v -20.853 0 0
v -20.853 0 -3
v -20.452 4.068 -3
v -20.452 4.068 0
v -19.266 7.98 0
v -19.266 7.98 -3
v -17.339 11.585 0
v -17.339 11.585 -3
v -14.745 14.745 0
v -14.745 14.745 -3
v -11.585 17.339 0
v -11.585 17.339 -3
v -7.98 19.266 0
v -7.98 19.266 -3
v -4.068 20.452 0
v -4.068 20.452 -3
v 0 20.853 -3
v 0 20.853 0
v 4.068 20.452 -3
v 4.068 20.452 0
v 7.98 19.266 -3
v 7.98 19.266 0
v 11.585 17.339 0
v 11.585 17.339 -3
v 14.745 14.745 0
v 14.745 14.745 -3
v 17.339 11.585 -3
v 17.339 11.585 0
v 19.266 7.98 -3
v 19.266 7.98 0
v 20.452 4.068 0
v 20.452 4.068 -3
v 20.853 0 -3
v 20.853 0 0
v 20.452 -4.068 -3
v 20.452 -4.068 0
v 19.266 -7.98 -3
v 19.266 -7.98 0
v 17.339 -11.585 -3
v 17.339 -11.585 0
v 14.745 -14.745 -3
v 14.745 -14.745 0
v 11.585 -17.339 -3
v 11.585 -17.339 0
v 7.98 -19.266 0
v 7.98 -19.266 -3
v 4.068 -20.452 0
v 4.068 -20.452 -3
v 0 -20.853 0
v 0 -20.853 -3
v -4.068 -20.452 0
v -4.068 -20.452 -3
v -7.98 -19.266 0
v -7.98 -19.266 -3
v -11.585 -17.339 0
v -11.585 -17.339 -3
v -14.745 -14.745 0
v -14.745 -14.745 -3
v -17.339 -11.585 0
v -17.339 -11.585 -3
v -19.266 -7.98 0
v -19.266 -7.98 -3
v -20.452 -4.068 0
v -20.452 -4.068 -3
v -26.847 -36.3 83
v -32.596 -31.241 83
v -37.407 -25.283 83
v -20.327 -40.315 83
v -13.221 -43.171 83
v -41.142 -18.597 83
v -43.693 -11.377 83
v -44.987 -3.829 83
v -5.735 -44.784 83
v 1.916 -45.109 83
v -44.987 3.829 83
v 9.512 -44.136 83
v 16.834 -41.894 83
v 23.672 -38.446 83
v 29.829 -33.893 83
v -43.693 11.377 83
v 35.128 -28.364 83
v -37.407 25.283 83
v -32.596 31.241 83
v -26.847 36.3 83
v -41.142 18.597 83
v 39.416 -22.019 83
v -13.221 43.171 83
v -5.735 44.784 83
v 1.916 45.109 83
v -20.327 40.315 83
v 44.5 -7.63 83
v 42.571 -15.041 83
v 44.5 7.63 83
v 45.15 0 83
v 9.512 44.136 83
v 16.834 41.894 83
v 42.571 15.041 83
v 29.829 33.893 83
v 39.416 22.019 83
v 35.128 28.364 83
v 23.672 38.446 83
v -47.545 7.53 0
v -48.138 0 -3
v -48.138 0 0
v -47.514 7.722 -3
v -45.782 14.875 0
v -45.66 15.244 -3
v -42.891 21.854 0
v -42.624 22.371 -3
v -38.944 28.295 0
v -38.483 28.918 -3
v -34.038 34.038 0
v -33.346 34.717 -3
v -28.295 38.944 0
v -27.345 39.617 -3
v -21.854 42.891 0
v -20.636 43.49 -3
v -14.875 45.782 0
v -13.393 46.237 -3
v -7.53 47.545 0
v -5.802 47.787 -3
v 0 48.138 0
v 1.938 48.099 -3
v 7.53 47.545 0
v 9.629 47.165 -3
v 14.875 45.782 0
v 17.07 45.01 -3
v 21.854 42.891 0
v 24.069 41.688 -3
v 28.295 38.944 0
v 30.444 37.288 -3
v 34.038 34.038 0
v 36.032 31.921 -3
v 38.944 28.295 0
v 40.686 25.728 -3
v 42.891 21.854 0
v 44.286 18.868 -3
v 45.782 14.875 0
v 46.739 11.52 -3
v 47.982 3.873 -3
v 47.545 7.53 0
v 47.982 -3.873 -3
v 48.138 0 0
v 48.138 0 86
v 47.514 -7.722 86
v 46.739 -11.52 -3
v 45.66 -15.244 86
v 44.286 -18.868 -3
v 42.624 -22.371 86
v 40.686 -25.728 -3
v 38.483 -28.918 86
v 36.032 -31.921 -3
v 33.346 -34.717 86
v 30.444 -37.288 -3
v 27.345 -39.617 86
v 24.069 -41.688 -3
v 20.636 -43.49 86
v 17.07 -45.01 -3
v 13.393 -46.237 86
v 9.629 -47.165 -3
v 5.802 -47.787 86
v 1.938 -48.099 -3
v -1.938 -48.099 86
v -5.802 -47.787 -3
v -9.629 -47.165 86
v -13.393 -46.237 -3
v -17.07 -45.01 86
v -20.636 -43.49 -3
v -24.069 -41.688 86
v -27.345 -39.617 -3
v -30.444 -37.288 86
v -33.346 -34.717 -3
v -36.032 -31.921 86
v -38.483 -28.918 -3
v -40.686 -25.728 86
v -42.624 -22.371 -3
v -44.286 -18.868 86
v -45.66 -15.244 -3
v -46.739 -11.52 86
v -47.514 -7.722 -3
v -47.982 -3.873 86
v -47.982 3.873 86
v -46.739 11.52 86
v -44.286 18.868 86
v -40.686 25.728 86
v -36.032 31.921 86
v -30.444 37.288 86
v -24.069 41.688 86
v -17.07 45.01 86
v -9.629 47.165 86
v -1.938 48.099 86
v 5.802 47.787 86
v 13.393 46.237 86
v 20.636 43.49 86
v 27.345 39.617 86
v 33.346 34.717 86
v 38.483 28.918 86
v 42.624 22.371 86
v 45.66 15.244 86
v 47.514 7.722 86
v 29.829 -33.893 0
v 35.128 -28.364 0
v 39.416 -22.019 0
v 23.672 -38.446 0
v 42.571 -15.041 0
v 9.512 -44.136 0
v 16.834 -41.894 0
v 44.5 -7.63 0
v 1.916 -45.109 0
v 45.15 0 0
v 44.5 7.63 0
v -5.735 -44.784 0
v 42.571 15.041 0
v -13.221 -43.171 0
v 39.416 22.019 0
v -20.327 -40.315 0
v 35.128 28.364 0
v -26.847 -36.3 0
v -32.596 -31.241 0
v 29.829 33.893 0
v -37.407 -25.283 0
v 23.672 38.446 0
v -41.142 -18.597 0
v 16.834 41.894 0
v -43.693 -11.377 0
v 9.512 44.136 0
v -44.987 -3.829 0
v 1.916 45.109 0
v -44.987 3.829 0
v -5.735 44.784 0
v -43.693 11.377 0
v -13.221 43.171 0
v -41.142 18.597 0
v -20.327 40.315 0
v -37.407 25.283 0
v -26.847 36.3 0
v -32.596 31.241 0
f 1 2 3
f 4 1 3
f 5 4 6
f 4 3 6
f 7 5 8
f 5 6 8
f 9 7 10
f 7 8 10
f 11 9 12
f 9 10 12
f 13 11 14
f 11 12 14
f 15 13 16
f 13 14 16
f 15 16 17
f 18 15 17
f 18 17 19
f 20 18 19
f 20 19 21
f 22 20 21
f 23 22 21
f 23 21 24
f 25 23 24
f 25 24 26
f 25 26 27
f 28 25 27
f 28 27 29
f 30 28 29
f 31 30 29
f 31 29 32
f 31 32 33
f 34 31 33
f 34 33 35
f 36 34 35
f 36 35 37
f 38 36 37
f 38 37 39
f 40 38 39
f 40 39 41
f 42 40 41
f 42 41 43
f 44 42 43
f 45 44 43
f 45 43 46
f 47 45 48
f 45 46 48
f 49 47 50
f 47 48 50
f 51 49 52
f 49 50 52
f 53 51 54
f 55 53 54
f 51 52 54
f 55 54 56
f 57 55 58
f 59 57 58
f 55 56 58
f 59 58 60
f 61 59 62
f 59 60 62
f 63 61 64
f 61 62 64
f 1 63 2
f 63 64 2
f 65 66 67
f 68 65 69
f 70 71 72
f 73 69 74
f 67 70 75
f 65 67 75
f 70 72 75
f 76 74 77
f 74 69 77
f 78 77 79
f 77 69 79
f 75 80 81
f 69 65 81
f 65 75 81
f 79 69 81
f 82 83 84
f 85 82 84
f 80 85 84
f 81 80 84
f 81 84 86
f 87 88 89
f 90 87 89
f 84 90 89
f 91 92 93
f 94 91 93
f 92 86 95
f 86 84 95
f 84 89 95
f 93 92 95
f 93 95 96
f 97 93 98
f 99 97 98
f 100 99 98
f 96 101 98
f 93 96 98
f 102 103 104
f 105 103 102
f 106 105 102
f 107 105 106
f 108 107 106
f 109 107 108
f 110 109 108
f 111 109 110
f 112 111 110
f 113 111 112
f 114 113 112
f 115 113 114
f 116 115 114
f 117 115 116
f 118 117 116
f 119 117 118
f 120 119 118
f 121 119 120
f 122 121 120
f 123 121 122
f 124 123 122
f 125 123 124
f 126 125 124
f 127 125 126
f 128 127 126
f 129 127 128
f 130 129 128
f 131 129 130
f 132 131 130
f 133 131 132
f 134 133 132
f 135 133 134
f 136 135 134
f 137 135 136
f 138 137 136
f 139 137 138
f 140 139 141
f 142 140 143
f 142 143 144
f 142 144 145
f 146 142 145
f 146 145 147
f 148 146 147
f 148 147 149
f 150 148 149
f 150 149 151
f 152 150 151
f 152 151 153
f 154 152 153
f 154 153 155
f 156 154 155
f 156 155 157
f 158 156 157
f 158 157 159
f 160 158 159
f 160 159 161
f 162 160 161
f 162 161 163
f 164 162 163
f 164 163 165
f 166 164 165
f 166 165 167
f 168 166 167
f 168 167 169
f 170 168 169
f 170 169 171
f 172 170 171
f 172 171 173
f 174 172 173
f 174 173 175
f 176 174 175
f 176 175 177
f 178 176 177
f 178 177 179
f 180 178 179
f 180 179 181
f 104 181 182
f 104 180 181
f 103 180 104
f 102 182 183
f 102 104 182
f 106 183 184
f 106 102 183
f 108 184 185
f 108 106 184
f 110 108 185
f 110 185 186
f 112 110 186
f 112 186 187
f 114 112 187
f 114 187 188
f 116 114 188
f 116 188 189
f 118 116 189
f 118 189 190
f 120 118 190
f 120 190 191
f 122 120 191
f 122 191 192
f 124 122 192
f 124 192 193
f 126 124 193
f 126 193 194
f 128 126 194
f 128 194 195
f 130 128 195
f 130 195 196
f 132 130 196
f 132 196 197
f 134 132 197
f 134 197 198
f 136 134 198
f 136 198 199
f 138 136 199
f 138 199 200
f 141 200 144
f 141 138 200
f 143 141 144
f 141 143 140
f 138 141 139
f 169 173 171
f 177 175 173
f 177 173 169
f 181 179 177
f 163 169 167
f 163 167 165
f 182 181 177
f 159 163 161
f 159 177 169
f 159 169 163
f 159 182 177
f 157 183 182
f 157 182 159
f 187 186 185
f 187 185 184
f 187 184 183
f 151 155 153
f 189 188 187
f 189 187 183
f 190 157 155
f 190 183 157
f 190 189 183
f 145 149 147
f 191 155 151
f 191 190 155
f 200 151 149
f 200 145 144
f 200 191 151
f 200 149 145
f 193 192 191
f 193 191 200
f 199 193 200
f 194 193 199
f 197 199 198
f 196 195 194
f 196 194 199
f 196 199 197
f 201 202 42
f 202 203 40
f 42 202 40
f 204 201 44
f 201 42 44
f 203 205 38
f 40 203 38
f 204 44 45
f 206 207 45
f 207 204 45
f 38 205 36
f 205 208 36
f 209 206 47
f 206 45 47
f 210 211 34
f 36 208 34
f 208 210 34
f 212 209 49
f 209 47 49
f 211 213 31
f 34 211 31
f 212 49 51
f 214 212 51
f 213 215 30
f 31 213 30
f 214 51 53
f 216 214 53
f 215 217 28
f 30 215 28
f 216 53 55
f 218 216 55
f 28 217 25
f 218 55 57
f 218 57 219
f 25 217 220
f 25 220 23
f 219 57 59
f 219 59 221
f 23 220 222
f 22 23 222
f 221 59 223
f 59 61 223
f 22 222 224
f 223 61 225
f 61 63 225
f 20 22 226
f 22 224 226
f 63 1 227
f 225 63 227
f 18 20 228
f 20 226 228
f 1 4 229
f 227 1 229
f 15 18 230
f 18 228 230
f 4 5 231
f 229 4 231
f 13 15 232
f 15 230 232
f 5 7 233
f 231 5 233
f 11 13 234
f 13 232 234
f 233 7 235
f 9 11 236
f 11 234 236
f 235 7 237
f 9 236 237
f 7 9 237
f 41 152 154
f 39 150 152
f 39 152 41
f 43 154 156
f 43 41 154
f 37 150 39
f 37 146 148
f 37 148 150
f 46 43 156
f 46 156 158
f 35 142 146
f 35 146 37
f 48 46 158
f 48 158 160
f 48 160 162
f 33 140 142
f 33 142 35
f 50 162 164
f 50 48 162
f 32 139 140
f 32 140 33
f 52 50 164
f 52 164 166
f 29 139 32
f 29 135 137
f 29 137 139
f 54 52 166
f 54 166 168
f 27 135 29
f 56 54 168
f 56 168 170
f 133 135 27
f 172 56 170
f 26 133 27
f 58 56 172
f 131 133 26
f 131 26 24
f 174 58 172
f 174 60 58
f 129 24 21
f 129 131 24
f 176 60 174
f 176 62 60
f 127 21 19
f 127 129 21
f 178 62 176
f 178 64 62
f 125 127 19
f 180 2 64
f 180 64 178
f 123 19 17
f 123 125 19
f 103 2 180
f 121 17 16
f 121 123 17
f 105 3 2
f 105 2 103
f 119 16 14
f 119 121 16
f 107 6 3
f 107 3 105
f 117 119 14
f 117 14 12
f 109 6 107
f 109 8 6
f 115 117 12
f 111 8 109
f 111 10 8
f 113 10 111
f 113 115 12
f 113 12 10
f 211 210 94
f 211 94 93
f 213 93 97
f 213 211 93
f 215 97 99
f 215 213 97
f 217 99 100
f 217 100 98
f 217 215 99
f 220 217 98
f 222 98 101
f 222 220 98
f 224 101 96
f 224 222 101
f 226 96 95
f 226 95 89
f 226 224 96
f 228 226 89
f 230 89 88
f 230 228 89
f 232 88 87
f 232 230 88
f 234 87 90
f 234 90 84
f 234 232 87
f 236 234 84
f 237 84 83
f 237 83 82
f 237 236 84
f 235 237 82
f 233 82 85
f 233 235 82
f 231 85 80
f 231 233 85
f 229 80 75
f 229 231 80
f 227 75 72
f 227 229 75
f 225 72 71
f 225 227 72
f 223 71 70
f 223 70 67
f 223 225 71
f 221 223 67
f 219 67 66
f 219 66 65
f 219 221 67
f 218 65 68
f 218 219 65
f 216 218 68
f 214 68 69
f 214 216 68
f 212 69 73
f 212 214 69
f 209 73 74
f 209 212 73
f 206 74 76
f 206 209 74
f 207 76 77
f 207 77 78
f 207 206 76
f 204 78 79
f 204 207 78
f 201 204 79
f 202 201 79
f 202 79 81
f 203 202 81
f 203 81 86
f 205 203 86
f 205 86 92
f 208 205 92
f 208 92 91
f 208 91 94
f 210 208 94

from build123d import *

# Parameters (mm, degrees)
SKETCH1_R           = 48.137692039
SKETCH1_R_2         = 45.149668872
BOSS_EXTRUDE1_DEPTH = 83
SKETCH2_R           = 48.137692039
BOSS_EXTRUDE2_DEPTH = 3
BOSS_EXTRUDE3_START = 3
SKETCH3_R           = 48.137692039
BOSS_EXTRUDE3_DEPTH = 3
SKETCH4_R           = 20.853102152
CUT_EXTRUDE1_DEPTH  = 17


with BuildPart() as part:
    # Sketch1 → Boss-Extrude1 (new body)
    with BuildSketch(Plane.XY):
        Circle(SKETCH1_R)
        Circle(SKETCH1_R_2, mode=Mode.SUBTRACT)
    extrude(amount=BOSS_EXTRUDE1_DEPTH)

    # Sketch2 → Boss-Extrude2 (add)
    with BuildSketch(Plane.XY.offset(83)):
        Circle(SKETCH2_R)
    extrude(amount=BOSS_EXTRUDE2_DEPTH)

    # Sketch3 → Boss-Extrude3 (add)
    with BuildSketch(Plane(origin=(0, 0, 0), x_dir=(-1, 0, 0), z_dir=(0, 0, -1)).offset(BOSS_EXTRUDE3_START)):
        Circle(SKETCH3_R)
    extrude(amount=-BOSS_EXTRUDE3_DEPTH)

    # Sketch4 → Cut-Extrude1 (cut)
    with BuildSketch(Plane(origin=(0, 0, -3), x_dir=(-1, 0, 0), z_dir=(0, 0, -1))):
        Circle(SKETCH4_R)
    extrude(amount=-CUT_EXTRUDE1_DEPTH, mode=Mode.SUBTRACT)


solid = part.part
